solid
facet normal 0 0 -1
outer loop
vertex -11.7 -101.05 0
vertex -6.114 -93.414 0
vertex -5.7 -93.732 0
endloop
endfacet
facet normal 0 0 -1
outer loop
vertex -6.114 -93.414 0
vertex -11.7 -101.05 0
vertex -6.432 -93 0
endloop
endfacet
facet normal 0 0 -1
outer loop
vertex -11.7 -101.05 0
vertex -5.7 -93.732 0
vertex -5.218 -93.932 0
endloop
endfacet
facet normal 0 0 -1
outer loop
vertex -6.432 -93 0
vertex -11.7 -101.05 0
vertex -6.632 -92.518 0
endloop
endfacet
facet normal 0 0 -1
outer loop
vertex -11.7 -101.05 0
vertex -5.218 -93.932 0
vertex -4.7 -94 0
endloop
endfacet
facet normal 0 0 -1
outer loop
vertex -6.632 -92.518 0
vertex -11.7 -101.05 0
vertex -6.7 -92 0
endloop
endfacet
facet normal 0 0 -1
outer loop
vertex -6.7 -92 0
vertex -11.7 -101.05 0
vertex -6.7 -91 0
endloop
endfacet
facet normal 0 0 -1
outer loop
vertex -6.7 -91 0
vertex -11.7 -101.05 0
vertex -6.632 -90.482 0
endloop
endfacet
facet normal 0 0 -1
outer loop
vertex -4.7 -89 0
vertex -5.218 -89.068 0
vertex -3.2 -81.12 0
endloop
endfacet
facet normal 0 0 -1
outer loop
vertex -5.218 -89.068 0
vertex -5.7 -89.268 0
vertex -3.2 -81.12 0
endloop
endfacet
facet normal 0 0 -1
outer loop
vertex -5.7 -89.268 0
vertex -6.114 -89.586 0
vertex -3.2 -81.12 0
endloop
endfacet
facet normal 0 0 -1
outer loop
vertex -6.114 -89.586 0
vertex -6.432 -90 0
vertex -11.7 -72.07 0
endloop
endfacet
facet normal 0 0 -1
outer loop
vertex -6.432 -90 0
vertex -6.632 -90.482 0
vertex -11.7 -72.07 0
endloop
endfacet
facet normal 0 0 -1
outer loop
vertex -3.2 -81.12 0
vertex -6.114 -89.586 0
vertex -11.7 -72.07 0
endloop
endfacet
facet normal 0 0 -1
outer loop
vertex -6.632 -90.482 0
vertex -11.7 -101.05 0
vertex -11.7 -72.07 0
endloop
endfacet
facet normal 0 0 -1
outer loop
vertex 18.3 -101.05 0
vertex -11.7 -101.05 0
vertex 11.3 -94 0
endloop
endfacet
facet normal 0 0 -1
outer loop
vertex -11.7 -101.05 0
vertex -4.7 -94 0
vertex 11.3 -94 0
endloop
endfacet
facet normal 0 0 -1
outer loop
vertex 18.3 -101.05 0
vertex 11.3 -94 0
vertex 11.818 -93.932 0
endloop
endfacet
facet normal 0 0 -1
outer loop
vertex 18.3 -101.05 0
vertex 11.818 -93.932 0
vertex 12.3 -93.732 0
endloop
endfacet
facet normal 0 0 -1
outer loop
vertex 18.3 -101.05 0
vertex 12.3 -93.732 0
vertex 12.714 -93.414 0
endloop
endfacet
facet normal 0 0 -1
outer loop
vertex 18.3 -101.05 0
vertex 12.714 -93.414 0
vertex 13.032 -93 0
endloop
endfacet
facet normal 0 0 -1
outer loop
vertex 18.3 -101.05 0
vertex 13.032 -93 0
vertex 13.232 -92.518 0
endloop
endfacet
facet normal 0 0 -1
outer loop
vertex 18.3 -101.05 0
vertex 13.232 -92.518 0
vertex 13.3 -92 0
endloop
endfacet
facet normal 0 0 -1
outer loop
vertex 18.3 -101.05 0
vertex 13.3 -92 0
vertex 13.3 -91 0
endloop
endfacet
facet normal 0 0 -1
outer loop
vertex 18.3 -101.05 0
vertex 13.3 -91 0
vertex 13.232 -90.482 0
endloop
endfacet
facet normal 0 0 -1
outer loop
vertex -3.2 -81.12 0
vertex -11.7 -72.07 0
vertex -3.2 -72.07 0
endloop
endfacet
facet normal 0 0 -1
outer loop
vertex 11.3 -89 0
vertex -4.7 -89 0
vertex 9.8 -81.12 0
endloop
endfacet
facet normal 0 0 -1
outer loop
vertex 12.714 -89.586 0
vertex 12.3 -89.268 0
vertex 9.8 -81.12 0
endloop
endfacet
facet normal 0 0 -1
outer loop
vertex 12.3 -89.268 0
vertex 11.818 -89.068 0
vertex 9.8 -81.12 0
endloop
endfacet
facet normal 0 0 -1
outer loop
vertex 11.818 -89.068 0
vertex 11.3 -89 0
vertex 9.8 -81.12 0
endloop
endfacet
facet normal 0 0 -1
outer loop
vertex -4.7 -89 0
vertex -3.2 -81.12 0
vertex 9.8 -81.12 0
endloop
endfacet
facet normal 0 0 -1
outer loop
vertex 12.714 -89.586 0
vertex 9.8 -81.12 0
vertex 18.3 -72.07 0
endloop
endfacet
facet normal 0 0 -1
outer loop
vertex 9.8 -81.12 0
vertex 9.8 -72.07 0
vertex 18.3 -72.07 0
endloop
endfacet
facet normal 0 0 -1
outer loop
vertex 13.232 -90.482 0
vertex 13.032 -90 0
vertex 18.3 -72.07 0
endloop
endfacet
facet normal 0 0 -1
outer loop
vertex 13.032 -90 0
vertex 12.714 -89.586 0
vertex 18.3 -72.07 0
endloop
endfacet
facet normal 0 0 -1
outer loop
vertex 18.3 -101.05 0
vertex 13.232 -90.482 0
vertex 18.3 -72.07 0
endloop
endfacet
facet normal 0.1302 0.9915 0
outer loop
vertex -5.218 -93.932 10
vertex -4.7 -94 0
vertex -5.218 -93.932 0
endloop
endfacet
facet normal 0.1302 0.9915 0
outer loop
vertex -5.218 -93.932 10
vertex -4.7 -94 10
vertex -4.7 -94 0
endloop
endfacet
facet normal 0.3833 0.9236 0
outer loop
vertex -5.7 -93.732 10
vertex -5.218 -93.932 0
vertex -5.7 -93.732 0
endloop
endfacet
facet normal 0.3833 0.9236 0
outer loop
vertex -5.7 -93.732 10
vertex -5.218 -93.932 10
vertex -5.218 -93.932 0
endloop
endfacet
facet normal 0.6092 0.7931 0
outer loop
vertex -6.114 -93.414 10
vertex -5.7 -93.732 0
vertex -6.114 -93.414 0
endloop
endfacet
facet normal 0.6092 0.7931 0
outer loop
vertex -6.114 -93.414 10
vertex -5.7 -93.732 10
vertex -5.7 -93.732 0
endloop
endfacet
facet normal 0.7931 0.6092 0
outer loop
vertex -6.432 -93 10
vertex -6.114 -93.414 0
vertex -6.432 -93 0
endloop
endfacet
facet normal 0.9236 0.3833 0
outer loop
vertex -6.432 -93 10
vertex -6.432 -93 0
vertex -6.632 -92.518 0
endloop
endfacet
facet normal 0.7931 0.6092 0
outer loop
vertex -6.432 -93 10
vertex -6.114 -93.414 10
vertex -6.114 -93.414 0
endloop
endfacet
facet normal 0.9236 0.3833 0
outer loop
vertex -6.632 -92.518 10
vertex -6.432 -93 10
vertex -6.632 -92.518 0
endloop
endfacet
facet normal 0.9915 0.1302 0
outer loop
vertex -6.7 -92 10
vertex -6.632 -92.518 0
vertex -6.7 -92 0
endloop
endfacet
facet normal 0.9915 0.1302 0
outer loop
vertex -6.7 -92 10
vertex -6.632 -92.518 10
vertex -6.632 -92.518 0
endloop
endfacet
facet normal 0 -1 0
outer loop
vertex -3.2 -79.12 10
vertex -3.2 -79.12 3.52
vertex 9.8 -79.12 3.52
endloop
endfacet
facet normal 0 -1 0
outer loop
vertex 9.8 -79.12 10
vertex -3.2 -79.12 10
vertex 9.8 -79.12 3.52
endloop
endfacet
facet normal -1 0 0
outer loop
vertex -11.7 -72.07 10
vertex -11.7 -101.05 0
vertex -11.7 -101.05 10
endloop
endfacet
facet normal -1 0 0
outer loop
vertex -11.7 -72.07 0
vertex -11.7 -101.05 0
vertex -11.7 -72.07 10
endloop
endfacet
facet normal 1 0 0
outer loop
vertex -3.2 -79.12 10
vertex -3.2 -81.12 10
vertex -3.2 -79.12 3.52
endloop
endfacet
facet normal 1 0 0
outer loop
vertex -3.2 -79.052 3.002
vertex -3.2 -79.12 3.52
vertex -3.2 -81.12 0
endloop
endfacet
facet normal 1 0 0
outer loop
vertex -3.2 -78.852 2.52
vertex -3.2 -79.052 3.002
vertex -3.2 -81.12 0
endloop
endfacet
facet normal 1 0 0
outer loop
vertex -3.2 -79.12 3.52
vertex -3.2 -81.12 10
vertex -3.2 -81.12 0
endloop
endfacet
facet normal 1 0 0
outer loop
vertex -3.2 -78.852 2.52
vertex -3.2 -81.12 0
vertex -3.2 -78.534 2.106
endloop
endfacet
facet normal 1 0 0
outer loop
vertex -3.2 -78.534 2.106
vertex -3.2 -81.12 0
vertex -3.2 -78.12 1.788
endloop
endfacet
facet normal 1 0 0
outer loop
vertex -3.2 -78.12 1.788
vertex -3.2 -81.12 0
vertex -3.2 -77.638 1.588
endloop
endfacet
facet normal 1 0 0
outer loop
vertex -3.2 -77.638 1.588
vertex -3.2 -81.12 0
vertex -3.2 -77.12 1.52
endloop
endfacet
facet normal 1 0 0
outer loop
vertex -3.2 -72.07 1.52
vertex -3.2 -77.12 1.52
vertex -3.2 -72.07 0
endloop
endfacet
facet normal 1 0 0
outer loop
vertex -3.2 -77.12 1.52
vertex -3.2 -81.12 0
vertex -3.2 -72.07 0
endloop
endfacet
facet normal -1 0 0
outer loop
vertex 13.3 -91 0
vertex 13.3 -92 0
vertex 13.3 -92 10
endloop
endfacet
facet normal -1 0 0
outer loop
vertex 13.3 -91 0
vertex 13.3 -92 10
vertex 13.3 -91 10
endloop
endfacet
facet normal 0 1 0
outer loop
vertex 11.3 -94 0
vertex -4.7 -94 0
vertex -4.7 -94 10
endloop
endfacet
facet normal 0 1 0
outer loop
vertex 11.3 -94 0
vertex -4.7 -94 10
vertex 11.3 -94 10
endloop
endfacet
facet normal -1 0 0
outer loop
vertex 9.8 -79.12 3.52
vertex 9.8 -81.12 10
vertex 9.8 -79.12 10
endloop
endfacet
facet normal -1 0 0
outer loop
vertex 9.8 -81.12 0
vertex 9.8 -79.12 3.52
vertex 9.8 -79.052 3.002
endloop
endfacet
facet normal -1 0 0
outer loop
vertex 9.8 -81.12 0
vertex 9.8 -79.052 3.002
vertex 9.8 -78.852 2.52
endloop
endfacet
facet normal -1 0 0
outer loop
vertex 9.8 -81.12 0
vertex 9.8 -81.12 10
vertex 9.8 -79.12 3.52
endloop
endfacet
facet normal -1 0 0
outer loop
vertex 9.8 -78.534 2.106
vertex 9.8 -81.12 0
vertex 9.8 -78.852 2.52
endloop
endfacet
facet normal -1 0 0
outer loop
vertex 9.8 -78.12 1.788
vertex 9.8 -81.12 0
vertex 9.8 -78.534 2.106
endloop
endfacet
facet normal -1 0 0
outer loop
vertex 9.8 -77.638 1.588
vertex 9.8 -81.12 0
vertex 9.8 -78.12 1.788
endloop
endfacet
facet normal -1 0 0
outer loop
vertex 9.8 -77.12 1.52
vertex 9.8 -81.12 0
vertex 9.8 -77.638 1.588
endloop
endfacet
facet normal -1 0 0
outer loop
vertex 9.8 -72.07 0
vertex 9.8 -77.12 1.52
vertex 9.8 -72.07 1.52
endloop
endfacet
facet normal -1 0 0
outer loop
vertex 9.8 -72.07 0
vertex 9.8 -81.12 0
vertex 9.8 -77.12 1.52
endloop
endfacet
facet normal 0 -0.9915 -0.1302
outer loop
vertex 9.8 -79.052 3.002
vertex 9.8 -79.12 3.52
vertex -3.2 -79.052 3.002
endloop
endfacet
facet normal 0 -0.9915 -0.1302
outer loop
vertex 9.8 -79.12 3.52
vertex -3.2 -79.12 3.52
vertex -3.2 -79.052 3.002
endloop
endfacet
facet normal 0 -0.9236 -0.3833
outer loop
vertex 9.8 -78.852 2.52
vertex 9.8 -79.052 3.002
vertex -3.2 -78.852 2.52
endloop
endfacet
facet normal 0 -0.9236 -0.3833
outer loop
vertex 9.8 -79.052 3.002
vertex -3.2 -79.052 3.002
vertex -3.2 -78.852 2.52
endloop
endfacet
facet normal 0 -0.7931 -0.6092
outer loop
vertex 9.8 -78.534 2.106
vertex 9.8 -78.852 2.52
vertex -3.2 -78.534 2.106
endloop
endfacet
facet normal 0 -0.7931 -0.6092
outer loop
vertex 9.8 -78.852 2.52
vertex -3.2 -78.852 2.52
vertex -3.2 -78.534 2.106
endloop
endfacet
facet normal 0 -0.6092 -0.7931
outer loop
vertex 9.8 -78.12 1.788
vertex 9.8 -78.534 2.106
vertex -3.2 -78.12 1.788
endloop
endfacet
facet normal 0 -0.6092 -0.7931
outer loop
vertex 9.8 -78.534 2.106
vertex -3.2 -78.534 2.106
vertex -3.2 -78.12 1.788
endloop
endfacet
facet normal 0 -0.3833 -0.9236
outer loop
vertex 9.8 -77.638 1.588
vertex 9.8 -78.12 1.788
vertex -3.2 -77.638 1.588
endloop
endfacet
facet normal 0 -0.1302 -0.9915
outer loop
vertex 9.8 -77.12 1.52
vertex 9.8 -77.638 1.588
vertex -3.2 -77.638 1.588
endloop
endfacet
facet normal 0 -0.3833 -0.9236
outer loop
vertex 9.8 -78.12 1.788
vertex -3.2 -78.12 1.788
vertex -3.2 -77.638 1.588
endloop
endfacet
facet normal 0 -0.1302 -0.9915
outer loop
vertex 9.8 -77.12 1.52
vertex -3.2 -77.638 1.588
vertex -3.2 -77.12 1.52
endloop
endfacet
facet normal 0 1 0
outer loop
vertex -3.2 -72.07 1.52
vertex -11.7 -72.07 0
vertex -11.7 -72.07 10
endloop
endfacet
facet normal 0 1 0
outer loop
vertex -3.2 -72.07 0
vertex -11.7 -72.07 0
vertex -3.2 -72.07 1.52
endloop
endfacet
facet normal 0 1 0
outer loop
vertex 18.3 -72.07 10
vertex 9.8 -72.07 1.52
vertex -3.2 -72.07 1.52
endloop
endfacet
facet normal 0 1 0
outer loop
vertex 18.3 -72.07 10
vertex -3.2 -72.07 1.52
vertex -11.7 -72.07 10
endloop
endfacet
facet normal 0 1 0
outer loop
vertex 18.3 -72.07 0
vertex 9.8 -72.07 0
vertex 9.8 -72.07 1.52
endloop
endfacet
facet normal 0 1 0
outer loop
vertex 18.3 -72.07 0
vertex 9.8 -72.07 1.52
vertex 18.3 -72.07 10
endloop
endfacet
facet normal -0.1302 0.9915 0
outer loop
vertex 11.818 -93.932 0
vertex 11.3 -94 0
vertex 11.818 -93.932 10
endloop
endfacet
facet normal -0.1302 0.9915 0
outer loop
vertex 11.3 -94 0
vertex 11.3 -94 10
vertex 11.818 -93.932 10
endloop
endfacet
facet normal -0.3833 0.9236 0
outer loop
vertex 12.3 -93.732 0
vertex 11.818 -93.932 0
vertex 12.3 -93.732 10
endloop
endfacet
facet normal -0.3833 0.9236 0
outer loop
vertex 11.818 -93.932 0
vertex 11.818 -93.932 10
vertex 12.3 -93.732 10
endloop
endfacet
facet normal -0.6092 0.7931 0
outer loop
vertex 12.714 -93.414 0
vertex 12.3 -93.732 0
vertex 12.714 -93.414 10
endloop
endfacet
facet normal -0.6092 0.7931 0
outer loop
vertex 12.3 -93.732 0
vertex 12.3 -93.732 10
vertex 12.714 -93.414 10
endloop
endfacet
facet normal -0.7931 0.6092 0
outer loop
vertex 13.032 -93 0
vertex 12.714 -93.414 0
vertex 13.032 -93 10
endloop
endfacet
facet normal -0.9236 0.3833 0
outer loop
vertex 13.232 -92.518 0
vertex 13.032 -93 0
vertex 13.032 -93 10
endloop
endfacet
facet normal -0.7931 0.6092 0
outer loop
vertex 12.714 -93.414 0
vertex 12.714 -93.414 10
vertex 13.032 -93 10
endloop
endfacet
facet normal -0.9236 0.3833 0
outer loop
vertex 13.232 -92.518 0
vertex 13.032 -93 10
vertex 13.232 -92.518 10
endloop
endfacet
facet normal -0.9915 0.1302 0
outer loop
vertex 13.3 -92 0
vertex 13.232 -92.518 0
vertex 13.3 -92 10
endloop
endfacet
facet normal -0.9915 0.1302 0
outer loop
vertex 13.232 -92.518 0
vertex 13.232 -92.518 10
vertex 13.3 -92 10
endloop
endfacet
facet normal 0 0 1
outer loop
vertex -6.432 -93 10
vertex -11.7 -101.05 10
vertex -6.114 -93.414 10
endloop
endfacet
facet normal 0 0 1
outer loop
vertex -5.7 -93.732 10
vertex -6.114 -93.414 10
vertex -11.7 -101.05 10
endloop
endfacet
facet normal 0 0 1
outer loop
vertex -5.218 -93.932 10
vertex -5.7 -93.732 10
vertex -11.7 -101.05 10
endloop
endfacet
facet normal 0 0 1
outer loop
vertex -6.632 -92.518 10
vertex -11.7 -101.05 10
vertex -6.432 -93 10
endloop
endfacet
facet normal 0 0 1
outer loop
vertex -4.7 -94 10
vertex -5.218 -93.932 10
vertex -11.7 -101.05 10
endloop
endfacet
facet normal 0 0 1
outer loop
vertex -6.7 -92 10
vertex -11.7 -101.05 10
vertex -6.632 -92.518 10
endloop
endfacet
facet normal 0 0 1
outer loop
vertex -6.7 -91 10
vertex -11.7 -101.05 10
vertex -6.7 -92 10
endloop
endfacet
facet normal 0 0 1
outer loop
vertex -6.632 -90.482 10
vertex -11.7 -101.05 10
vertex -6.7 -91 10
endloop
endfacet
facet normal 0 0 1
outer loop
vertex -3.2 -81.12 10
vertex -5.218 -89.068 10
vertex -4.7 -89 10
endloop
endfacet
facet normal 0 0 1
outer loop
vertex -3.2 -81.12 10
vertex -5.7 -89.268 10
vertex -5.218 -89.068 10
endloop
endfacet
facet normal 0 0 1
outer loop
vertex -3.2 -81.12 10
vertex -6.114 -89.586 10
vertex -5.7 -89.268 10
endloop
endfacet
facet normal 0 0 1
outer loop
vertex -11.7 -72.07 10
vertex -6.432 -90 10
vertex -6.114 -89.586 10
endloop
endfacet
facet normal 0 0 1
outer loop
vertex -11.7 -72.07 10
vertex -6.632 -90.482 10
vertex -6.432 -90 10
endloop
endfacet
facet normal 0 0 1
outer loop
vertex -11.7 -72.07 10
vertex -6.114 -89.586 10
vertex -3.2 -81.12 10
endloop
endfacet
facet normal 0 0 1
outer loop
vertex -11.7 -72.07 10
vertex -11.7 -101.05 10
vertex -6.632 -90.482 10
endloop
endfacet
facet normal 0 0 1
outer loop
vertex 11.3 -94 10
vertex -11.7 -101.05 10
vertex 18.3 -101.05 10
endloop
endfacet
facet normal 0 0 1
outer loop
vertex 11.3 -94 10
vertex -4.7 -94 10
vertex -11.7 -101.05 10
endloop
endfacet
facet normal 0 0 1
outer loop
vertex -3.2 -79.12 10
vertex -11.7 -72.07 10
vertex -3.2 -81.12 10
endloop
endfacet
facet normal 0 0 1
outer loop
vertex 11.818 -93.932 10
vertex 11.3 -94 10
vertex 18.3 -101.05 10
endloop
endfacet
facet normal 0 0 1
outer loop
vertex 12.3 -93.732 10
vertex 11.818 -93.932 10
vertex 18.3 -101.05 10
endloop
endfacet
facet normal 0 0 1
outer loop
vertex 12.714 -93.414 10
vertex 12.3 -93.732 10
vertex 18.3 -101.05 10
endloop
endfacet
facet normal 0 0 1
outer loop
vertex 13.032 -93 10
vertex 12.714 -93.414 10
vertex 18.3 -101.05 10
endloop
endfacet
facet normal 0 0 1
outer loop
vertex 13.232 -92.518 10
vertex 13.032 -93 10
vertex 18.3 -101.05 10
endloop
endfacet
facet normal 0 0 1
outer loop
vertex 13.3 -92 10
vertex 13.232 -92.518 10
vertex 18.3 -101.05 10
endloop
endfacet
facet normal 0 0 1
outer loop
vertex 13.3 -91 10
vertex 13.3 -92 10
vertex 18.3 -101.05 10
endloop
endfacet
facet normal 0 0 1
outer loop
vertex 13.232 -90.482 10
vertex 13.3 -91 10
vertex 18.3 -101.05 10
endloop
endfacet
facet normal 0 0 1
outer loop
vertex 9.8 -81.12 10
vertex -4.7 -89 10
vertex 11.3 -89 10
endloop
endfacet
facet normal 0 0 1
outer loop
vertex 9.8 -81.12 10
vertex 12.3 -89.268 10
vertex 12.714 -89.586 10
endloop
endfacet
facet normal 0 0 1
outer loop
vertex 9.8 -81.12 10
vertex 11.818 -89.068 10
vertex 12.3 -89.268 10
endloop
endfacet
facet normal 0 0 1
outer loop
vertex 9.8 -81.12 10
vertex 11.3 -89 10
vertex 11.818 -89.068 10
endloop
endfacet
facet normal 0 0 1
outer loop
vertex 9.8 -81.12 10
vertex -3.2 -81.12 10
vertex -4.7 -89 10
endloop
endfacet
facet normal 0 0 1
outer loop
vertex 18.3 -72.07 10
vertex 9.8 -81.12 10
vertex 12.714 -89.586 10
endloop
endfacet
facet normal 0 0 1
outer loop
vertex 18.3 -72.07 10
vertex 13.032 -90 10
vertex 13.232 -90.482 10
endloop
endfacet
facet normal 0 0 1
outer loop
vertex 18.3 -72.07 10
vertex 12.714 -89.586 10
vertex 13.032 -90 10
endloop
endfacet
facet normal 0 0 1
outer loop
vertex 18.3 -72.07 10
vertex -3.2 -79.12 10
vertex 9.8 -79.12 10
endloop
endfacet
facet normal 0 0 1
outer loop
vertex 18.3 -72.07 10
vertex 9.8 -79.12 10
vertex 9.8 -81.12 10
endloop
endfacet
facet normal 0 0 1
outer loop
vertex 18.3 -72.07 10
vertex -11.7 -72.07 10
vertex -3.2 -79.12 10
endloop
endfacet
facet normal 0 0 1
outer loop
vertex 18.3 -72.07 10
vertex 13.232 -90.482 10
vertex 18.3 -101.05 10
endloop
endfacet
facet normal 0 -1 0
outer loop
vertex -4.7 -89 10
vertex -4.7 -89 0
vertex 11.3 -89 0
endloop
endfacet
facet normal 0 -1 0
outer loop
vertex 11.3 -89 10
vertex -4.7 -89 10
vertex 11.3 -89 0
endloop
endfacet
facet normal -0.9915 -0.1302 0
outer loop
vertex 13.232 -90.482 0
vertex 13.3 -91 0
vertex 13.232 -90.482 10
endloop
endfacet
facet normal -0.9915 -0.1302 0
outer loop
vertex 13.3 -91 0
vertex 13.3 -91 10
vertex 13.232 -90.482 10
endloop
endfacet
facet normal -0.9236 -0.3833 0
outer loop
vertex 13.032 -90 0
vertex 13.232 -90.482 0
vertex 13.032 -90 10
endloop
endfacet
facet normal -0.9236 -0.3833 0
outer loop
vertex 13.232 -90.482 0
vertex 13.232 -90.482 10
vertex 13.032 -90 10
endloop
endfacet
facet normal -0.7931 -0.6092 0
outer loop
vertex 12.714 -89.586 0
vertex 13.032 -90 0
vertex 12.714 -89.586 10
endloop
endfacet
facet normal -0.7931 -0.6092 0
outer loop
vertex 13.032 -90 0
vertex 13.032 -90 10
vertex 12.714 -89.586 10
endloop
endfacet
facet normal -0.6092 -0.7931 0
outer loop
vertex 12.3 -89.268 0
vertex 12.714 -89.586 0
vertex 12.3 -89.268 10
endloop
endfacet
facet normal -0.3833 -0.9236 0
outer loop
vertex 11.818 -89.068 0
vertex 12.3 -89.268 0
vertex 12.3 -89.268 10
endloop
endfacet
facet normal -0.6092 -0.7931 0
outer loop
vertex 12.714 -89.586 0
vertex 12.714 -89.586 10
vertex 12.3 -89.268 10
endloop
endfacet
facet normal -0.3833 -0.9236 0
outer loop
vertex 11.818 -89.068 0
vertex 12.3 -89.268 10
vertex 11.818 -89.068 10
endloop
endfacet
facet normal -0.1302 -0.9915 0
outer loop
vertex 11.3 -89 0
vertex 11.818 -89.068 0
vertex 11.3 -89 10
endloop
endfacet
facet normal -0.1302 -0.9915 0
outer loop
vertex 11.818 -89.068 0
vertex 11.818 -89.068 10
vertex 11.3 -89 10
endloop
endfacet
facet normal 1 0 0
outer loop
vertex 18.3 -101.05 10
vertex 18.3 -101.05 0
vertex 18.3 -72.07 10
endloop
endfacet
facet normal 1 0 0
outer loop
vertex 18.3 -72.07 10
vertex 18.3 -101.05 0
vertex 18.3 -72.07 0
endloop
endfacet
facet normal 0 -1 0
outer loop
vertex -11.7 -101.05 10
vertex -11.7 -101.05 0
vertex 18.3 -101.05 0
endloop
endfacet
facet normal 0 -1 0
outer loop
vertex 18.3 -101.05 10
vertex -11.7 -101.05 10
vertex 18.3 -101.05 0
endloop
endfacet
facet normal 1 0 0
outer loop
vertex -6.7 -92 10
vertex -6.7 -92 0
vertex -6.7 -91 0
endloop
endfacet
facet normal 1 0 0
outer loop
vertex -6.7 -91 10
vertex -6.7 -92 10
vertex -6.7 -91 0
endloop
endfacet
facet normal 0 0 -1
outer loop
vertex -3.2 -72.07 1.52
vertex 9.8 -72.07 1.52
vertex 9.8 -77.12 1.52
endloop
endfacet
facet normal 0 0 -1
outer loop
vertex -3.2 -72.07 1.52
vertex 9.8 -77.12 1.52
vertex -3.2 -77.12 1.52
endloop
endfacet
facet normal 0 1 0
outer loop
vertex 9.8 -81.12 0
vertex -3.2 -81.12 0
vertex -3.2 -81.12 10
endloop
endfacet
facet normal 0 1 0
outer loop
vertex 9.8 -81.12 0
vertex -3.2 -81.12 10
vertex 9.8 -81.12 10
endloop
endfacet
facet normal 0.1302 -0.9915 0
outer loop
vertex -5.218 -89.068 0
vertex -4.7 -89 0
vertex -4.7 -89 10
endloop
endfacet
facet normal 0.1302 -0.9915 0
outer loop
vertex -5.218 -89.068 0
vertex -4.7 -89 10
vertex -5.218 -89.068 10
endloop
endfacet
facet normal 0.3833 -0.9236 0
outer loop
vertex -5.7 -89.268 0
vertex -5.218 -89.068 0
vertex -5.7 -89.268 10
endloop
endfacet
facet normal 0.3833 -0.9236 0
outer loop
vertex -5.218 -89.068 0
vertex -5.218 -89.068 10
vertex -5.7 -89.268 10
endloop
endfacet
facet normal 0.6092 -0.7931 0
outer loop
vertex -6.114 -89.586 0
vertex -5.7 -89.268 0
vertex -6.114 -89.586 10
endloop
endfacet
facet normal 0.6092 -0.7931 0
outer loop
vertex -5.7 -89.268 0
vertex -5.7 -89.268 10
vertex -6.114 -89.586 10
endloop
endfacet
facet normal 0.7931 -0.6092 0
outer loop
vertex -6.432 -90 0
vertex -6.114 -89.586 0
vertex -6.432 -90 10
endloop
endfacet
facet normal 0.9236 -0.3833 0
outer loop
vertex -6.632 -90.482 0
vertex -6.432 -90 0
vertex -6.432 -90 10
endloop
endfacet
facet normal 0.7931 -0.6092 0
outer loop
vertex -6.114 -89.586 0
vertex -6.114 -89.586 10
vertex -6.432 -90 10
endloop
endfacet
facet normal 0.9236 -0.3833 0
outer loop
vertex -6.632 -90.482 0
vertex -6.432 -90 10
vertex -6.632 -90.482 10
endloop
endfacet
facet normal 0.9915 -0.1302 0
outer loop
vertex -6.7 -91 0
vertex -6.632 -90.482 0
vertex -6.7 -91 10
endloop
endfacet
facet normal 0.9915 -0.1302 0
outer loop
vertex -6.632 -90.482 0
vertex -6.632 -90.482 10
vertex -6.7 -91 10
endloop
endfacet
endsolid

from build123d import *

# Parameters (mm, degrees)
SKETCH1_W           = 30
SKETCH1_H           = 28.98
SKETCH1_W_2         = 13
SKETCH1_H_2         = 2
SKETCH1_W_3         = 20
SKETCH1_H_3         = 5
BOSS_EXTRUDE1_DEPTH = 10
FILLET1_R           = 2
SKETCH2_W           = 13
SKETCH2_H           = 7.05
CUT_EXTRUDE1_DEPTH  = 1.52
FILLET2_R           = 2


with BuildPart() as part:
    # Sketch1 → Boss-Extrude1 (new body)
    with BuildSketch(Plane.XY):
        with Locations((3.3, -86.56)):
            Rectangle(SKETCH1_W, SKETCH1_H)
        with Locations((3.3, -80.12)):
            Rectangle(SKETCH1_W_2, SKETCH1_H_2, mode=Mode.SUBTRACT)
        with Locations((3.3, -91.5)):
            Rectangle(SKETCH1_W_3, SKETCH1_H_3, mode=Mode.SUBTRACT)
    extrude(amount=BOSS_EXTRUDE1_DEPTH)

    # Fillet1
    fillet1_edges = [part.edges().sort_by_distance(p)[0] for p in [
        (-6.7, -89, 5),
        (-6.7, -94, 5),
        (13.3, -94, 5),
        (13.3, -89, 5),
    ]]
    fillet(fillet1_edges, radius=FILLET1_R)

    # Sketch2 → Cut-Extrude1 (cut)
    with BuildSketch(Plane(origin=(0, 0, 0), x_dir=(-1, 0, 0), z_dir=(0, 0, -1))):
        with Locations((-3.3, -75.595)):
            Rectangle(SKETCH2_W, SKETCH2_H)
    extrude(amount=-CUT_EXTRUDE1_DEPTH, mode=Mode.SUBTRACT)

    # Fillet2
    fillet2_edges = [part.edges().sort_by_distance(p)[0] for p in [
        (3.3, -79.12, 1.52),
    ]]
    fillet(fillet2_edges, radius=FILLET2_R)


solid = part.part
